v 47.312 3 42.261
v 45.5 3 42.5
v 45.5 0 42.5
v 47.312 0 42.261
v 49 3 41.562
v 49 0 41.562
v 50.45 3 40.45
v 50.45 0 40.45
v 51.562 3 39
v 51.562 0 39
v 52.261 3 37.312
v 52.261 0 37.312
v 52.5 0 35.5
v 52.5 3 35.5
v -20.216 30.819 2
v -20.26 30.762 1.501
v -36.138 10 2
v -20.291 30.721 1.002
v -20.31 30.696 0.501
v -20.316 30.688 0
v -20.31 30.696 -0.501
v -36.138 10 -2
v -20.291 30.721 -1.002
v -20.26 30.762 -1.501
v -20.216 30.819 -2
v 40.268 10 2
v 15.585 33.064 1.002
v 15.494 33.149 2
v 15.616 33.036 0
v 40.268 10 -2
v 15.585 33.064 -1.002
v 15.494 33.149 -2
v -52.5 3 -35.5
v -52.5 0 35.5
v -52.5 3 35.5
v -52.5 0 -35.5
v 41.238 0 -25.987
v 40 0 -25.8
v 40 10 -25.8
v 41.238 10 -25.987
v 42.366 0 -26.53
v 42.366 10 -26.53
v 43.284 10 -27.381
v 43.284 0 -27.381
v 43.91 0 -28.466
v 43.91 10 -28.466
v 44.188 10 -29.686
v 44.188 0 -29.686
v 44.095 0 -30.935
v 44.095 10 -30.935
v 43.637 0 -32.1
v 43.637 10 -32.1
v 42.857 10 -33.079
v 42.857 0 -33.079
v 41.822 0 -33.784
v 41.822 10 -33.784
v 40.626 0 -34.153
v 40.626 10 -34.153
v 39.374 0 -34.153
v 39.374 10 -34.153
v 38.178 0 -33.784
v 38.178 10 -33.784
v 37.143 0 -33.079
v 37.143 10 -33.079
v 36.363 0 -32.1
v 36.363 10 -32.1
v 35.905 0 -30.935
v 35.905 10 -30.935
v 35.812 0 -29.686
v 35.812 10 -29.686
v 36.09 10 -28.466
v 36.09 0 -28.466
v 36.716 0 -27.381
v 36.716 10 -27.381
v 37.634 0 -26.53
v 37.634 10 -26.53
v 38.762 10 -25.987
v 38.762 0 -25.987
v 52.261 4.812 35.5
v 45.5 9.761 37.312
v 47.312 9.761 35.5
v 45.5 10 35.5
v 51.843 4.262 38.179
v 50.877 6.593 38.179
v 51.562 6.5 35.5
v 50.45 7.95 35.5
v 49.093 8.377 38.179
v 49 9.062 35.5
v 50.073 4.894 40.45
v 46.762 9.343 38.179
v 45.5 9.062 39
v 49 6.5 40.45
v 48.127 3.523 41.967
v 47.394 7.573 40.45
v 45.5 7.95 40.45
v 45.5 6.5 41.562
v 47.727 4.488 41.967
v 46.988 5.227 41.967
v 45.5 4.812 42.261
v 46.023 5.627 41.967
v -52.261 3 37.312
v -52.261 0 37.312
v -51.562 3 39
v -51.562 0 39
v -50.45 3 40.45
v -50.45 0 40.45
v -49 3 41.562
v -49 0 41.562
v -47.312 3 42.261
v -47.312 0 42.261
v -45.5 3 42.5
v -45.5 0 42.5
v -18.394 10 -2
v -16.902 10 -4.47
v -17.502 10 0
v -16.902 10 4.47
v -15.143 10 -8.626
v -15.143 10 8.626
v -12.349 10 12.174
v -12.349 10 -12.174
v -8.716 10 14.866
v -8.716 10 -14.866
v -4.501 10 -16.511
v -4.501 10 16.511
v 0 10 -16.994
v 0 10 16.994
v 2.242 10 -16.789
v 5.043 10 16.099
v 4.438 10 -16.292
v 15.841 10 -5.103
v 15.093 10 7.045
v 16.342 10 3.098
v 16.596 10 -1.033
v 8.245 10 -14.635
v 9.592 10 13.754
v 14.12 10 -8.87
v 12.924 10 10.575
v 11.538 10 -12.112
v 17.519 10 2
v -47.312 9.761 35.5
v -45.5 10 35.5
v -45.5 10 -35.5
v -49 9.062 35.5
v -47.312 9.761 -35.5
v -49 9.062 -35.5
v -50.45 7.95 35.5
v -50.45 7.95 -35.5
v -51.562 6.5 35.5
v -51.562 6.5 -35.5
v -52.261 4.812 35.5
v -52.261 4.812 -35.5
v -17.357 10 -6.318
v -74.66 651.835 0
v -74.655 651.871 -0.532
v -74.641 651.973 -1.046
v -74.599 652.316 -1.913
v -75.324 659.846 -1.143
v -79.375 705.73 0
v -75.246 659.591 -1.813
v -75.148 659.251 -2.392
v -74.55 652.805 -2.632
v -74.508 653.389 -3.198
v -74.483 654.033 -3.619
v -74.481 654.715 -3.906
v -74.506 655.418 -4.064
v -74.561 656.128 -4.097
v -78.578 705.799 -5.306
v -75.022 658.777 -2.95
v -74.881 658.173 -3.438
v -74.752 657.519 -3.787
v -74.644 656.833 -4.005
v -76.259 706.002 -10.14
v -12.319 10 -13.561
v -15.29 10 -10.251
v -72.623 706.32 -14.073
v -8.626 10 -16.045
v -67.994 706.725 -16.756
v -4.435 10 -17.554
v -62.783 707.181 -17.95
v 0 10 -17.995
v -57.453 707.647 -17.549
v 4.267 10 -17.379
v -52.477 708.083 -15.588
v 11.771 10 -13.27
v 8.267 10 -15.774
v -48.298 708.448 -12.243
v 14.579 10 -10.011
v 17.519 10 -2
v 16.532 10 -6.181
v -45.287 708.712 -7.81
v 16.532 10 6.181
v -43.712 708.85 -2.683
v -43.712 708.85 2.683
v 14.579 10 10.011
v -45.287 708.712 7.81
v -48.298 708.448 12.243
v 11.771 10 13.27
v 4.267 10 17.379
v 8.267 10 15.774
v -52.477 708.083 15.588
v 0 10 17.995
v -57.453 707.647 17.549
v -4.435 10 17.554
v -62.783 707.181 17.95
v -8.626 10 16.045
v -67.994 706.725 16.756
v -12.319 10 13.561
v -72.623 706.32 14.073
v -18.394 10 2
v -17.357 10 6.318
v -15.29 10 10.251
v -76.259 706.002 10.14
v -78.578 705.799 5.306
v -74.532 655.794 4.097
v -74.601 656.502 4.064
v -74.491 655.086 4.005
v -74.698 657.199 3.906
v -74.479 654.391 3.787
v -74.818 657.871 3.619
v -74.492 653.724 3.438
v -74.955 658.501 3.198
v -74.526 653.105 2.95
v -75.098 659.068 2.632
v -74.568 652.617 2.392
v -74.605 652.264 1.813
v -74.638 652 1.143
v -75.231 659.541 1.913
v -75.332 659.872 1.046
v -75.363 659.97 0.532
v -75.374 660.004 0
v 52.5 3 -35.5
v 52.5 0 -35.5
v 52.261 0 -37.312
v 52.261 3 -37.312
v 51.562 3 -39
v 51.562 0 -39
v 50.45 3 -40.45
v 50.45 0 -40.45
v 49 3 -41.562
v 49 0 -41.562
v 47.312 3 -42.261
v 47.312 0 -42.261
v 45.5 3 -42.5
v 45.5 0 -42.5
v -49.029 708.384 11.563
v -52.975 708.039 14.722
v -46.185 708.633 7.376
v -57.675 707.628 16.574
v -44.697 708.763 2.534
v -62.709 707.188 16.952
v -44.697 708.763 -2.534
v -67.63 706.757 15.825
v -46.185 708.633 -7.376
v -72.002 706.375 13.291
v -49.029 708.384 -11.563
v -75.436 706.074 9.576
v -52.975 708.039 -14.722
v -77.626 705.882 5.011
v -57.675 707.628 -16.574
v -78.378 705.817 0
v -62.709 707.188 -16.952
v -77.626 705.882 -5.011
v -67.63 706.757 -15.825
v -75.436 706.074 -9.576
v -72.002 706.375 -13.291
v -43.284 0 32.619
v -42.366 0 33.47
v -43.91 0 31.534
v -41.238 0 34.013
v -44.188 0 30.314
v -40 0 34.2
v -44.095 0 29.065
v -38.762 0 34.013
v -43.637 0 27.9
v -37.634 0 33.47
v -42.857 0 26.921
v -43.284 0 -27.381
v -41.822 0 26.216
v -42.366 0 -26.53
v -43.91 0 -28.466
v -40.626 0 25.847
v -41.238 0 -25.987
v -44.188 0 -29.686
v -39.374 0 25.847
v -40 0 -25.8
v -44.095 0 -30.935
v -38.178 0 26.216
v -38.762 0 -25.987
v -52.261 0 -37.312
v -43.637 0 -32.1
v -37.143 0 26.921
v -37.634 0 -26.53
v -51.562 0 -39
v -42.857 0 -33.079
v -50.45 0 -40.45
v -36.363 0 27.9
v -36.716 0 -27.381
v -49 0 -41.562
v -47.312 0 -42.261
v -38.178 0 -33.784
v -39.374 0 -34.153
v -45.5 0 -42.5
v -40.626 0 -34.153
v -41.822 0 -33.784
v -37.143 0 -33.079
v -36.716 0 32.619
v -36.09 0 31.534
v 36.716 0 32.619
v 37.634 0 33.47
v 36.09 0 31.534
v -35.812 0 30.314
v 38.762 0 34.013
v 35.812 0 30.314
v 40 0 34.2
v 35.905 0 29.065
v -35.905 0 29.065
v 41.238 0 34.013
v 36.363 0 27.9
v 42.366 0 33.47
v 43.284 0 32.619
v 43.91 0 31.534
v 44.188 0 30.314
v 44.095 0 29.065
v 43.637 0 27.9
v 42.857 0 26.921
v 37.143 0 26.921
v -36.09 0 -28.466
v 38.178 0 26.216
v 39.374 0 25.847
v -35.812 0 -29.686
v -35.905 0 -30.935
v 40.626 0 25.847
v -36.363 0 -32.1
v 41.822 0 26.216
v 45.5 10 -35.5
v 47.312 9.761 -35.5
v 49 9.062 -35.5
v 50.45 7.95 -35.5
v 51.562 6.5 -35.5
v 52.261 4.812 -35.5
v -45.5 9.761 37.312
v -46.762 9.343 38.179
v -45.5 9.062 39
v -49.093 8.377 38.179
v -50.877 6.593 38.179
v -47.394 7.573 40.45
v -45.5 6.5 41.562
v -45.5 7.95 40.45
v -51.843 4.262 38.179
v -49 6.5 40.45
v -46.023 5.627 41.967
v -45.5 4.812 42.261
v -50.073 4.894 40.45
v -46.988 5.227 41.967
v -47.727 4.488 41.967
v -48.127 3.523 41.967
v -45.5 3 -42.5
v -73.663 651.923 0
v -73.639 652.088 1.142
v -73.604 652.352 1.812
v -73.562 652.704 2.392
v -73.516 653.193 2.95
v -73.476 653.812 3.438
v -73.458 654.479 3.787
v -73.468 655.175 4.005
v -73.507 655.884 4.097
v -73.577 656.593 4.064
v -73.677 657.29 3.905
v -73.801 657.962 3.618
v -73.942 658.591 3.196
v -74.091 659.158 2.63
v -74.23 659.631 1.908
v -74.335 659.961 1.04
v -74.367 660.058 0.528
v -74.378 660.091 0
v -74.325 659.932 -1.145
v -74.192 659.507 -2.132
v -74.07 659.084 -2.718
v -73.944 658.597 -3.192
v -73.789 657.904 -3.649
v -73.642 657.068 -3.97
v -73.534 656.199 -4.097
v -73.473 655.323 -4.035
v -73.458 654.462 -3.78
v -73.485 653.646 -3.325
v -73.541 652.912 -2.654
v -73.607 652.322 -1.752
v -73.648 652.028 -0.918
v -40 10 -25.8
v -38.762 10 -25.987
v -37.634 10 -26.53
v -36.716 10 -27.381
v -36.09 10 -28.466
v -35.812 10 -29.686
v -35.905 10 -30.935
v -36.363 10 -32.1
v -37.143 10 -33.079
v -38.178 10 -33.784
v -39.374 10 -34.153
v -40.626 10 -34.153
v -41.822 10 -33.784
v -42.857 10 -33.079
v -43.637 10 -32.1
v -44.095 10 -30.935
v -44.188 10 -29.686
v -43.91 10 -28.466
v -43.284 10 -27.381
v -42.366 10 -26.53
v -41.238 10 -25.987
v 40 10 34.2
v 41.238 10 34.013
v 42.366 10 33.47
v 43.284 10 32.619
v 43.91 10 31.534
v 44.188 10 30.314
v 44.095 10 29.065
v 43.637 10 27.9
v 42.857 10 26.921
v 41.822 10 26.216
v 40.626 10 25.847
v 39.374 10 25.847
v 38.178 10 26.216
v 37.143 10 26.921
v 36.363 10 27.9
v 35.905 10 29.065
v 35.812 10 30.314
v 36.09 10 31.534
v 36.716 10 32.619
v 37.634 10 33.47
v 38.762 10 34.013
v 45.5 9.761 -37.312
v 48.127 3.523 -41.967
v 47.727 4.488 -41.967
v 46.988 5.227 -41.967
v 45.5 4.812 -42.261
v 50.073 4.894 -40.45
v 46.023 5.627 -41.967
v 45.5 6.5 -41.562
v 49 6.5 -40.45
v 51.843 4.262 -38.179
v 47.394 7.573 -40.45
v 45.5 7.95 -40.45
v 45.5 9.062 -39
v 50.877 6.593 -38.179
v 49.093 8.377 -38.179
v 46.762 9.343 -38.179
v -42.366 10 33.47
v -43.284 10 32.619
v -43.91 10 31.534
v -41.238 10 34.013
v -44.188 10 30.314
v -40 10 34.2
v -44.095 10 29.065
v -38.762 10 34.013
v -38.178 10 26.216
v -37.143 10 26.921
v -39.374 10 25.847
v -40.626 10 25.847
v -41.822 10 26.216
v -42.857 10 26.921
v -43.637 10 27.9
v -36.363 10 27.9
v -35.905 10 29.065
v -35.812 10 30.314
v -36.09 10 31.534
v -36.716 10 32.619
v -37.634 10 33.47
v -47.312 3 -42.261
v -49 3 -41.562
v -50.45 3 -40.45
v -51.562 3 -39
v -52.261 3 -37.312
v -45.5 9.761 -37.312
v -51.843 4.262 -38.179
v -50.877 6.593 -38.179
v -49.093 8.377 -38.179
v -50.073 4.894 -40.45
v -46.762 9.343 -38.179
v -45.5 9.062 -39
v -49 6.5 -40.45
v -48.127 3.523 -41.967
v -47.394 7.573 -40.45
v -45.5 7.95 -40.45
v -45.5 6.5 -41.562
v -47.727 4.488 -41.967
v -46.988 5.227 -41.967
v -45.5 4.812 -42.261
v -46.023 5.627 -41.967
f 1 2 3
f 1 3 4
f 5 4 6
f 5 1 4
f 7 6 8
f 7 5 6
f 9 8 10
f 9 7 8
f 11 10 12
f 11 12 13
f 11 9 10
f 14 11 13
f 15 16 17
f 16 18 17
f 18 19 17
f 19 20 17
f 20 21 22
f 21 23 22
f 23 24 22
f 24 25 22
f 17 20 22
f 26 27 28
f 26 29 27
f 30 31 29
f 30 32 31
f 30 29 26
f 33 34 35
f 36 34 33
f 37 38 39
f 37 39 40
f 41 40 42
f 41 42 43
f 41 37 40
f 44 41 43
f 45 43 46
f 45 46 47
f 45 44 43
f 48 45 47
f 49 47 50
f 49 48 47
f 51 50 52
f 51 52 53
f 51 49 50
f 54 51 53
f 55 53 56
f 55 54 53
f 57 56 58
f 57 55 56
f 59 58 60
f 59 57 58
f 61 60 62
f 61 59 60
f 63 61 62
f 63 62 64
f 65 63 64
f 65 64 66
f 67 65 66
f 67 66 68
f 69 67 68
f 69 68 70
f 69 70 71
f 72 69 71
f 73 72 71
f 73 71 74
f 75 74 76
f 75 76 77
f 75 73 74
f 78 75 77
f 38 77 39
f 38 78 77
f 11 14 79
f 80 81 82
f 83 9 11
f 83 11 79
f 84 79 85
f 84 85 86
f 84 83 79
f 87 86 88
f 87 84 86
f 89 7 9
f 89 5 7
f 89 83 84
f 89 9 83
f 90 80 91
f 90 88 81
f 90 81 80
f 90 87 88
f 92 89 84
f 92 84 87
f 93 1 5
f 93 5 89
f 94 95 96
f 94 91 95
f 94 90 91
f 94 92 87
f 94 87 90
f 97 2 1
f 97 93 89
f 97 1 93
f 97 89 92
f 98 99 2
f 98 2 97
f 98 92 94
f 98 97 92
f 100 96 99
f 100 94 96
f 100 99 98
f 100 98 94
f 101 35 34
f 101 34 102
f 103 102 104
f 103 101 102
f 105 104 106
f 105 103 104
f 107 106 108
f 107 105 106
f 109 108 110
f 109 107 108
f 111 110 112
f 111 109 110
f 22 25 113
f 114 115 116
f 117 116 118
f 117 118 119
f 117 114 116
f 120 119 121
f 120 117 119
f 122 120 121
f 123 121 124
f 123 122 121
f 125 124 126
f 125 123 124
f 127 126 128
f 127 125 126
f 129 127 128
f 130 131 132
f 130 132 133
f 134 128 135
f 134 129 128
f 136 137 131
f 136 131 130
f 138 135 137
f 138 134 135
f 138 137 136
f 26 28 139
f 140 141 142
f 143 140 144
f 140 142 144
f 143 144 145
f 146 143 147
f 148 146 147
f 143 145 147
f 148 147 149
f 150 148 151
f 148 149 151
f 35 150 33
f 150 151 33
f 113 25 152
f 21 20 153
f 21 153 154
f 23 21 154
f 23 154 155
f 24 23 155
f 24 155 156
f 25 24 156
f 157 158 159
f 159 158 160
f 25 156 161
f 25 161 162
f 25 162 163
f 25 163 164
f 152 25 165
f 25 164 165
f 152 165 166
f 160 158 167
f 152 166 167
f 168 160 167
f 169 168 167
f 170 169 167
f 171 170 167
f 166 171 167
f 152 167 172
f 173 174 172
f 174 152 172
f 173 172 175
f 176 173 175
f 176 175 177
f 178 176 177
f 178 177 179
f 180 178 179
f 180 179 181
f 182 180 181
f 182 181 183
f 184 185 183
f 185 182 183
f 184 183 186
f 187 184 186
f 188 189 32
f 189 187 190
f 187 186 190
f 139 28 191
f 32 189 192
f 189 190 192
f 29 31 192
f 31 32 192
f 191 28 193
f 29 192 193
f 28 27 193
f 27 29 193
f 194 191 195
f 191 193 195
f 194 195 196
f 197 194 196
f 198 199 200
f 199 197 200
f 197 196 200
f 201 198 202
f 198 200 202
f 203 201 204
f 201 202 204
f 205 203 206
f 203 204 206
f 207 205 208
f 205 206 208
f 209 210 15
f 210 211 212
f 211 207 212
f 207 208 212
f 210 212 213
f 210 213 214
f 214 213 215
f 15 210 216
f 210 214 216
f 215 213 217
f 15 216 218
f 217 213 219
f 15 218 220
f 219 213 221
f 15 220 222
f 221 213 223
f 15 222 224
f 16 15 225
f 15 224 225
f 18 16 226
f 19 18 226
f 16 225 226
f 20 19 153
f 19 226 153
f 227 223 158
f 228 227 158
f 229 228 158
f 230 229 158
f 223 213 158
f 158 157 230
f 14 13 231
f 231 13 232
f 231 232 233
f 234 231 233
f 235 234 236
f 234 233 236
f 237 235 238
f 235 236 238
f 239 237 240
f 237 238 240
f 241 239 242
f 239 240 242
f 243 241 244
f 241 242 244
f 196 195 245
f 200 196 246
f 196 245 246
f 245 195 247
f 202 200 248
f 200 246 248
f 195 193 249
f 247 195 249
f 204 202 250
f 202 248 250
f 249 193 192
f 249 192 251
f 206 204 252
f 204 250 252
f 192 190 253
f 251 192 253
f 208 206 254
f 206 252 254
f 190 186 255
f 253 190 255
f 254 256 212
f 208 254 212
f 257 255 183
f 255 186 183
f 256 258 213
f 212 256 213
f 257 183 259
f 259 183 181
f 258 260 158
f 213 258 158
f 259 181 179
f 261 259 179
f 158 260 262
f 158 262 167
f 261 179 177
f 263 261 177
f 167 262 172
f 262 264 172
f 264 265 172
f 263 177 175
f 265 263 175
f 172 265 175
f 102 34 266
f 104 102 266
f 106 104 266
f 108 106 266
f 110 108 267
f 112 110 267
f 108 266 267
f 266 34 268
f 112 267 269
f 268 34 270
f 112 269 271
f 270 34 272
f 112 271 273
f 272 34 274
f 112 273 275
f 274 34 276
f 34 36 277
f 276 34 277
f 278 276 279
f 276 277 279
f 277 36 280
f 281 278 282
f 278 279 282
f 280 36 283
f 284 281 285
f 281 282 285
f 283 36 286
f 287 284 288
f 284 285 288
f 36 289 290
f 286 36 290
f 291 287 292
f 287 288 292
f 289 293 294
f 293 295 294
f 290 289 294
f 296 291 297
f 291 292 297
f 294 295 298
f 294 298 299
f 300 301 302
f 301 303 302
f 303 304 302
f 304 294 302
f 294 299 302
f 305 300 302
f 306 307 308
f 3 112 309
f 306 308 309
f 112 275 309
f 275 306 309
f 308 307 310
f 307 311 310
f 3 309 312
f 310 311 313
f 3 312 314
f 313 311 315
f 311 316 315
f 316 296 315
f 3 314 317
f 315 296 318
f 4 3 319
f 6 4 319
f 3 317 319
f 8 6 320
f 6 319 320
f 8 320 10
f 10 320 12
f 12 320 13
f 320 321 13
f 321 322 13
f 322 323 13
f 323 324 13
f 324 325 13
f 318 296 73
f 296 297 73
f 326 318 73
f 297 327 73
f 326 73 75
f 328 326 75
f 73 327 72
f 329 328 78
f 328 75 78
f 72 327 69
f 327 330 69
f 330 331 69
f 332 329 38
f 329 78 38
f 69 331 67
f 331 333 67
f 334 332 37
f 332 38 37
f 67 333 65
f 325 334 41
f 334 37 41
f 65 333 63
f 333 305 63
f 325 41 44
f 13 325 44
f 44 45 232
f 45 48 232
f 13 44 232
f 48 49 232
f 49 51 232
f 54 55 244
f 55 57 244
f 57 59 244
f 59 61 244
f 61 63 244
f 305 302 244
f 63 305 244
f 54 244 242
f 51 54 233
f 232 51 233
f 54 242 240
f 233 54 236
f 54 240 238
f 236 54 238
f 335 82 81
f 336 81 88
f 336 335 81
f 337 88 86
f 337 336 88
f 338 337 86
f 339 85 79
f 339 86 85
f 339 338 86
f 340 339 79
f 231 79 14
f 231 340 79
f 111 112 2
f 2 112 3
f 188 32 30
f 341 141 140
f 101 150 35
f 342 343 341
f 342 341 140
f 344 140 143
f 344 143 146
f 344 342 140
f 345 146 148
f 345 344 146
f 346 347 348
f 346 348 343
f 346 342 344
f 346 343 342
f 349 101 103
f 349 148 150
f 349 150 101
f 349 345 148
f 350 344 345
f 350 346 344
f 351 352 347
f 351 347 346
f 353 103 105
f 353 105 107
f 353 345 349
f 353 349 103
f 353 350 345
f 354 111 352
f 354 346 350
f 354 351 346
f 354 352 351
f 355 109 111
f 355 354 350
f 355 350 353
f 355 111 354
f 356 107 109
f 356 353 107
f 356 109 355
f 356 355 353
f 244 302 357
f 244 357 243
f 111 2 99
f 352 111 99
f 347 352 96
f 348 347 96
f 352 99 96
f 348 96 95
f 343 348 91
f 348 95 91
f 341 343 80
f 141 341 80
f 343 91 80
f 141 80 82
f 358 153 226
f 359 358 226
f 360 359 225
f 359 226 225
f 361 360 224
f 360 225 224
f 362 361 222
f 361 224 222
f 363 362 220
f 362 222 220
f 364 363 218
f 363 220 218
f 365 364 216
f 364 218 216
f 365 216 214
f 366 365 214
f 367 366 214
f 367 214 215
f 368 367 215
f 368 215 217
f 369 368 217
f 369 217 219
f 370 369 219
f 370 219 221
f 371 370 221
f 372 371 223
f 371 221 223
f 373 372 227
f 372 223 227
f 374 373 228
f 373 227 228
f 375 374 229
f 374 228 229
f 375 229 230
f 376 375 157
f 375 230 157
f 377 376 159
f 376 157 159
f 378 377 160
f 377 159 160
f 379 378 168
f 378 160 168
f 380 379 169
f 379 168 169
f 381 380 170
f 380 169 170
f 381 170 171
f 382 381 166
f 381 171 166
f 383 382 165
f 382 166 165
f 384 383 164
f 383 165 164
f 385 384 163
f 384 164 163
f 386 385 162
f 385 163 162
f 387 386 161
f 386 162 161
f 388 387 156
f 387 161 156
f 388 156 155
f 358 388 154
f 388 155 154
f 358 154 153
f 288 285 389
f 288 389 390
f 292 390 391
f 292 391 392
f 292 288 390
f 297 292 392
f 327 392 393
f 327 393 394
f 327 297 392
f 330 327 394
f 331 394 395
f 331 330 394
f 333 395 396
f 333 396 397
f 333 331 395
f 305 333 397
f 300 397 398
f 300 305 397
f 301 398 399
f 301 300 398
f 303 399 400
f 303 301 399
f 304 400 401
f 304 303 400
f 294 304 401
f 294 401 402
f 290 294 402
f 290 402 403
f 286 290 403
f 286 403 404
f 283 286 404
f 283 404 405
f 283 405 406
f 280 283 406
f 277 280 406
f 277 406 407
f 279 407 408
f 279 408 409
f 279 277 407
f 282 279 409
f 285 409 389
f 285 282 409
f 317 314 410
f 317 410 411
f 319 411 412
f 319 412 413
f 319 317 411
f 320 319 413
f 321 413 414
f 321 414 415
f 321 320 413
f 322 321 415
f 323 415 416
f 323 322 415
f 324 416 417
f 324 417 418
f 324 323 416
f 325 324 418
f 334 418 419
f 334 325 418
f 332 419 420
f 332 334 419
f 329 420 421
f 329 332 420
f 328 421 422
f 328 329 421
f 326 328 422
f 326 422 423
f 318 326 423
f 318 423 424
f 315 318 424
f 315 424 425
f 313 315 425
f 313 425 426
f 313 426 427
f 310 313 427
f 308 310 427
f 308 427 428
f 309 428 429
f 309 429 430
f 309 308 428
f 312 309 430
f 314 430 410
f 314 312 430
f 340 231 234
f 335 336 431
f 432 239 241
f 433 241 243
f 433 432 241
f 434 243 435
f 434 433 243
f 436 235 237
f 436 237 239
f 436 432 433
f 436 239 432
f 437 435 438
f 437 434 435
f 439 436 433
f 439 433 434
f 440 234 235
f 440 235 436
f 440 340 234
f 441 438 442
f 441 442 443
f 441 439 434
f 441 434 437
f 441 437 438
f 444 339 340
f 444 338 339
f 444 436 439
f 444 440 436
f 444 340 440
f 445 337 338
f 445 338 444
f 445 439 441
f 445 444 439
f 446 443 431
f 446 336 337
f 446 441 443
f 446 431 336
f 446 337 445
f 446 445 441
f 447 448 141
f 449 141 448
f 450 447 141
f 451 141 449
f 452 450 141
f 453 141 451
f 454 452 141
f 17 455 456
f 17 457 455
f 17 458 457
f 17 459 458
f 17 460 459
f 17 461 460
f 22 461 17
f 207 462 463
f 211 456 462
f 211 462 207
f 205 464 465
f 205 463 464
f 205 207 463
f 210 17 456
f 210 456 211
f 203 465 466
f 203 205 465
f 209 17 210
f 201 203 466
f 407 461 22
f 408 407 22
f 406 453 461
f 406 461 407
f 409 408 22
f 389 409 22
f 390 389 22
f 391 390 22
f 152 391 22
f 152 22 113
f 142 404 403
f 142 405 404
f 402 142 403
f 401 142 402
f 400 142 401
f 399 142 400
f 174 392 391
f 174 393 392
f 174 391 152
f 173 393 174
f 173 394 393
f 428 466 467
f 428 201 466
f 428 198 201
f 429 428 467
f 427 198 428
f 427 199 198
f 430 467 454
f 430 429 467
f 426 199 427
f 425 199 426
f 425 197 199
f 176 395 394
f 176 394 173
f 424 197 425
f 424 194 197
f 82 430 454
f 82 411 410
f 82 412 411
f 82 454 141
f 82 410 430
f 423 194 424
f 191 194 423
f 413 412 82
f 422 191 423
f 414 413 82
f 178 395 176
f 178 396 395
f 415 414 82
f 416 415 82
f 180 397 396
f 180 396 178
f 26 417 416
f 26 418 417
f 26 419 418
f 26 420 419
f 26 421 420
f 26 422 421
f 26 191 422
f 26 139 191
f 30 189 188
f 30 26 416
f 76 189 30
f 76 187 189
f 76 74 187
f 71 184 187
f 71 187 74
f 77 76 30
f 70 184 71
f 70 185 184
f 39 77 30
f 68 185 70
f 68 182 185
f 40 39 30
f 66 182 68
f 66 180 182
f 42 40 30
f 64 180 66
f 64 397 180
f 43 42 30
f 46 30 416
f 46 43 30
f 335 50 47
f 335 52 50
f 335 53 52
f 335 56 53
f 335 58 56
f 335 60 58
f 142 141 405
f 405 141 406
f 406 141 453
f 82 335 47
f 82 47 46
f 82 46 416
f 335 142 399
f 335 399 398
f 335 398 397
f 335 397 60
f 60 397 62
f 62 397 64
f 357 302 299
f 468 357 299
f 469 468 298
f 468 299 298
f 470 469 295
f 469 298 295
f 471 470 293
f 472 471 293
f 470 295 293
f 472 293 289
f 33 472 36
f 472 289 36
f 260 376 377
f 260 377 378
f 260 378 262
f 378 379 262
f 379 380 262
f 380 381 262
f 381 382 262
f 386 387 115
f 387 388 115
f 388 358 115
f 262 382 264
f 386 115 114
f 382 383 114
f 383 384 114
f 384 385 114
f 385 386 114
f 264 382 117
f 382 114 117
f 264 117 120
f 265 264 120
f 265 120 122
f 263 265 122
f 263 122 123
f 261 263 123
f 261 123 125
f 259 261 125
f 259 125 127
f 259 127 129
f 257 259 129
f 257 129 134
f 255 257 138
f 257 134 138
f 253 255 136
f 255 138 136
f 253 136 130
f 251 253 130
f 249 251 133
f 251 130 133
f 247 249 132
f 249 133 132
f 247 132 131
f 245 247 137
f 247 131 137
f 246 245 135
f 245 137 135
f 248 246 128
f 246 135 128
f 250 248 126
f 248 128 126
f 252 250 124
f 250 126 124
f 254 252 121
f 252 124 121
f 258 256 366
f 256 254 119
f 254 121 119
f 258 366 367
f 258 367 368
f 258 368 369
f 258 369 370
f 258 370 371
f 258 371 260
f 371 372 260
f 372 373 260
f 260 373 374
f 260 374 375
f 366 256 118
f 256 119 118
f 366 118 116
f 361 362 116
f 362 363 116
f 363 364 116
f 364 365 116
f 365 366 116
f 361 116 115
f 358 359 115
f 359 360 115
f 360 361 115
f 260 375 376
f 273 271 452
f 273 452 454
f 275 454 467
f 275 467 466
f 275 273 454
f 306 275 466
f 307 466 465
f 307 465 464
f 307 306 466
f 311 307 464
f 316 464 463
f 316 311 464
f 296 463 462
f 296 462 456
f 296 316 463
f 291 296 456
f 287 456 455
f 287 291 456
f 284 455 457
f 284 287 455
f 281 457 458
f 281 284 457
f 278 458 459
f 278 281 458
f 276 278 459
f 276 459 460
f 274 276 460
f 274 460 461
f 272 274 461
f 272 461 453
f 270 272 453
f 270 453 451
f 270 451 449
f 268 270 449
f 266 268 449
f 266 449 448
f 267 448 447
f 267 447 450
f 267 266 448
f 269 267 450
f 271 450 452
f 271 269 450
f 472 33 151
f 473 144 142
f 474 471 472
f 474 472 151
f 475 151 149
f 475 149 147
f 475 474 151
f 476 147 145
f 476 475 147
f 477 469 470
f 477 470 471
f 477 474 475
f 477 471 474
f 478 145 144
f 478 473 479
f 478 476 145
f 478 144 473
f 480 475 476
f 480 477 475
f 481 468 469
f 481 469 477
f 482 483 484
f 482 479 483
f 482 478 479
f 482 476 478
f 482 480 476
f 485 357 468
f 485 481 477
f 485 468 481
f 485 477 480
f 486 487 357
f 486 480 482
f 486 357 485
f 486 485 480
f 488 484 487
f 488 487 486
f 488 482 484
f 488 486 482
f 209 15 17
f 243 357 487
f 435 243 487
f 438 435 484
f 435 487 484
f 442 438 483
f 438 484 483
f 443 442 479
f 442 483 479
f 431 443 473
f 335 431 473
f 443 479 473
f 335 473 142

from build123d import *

# Parameters (mm, degrees)
SKETCH1_W                       = 105
SKETCH1_H                       = 85
SKETCH1_R                       = 4.2
BOSS_EXTRUDE1_DEPTH             = 10
SKETCH14_R                      = 18
SKETCH14_R_2                    = 17
BOSS_EXTRUDE4_DEPTH             = 700
BOSS_EXTRUDE4_DIRECTION_2_REACH = 70.283
RIB2_REACH                      = 716.562
SKETCH21_WALL_W                 = 1464.864259786
SKETCH21_WALL_H                 = 4
RIB5_REACH                      = 716.562
SKETCH22_WALL_W                 = 1457.169117376
SKETCH22_WALL_H                 = 4
FILLET1_R                       = 7
FILLET2_R                       = 7
CUT_EXTRUDE1_REACH              = 717.102
CUT_EXTRUDE1_END_RADIUS         = 17
SKETCH26_R                      = 4.1


with BuildPart() as part:
    # Sketch1 → Boss-Extrude1 (new body)
    with BuildSketch(Plane(origin=(0, 0, 0), x_dir=(1, 0, 0), z_dir=(0, 1, 0))):
        Rectangle(SKETCH1_W, SKETCH1_H)
        with Locations(Location((-40, -30, 0), (0, 0, 270))):
            Circle(SKETCH1_R, mode=Mode.SUBTRACT)
        with Locations(Location((40, 30, 0), (0, 0, 270))):
            Circle(SKETCH1_R, mode=Mode.SUBTRACT)
        with Locations(Location((40, -30, 0), (0, 0, 270))):
            Circle(SKETCH1_R, mode=Mode.SUBTRACT)
        with Locations(Location((-40, 30, 0), (0, 0, 270))):
            Circle(SKETCH1_R, mode=Mode.SUBTRACT)
    extrude(amount=BOSS_EXTRUDE1_DEPTH)

    # Sketch14 → Boss-Extrude4 (add)
    with BuildSketch(Plane(origin=(0, 10, 0), x_dir=(-0.9961946980917459, -0.08715574274765506, 0), z_dir=(0.08715574274765506, -0.9961946980917459, 0))):
        with Locations((0.435778714, 0)):
            Circle(SKETCH14_R)
        with Locations((0.435778714, 0)):
            Circle(SKETCH14_R_2, mode=Mode.SUBTRACT)
    extrude(amount=-BOSS_EXTRUDE4_DEPTH)

    # Boss-Extrude4 direction 2: up to this face of the body (flat: up to its plane)
    boss_extrude4_direction_2_end = Plane(part.part.faces().sort_by_distance((0, 10, 0))[0])
    # Sketch14 → Boss-Extrude4 direction 2 (add, up to the picked face)
    with BuildSketch(Plane(origin=(0, 10, 0), x_dir=(-0.9961946980917459, -0.08715574274765506, 0), z_dir=(0.08715574274765506, -0.9961946980917459, 0)), mode=Mode.PRIVATE) as boss_extrude4_direction_2_sk1:
        with Locations((0.435778714, 0)):
            Circle(SKETCH14_R)
        with Locations((0.435778714, 0)):
            Circle(SKETCH14_R_2, mode=Mode.SUBTRACT)
    boss_extrude4_direction_2_tool1 = split(extrude(boss_extrude4_direction_2_sk1.sketch, amount=BOSS_EXTRUDE4_DIRECTION_2_REACH, mode=Mode.PRIVATE), bisect_by=boss_extrude4_direction_2_end, keep=Keep.BOTH, mode=Mode.PRIVATE)
    add(boss_extrude4_direction_2_tool1.solids().sort_by(Axis((16.990205, 11.48645, 0), (0.08715574274765506, -0.9961946980917459, 0)))[0])

    # Sketch21 wall → Rib2 (add, up to next)
    with BuildSketch(Plane(origin=(27.942090865, 21.517823641, 0), x_dir=(0.730658017889, -0.682743627502, 0), z_dir=(0.682743627502, 0.730658017889, 0)), mode=Mode.PRIVATE) as rib2_sk1:
        Rectangle(SKETCH21_WALL_W, SKETCH21_WALL_H)
    rib2_tool1 = extrude(rib2_sk1.sketch, amount=-RIB2_REACH, mode=Mode.PRIVATE) - part.part
    add(rib2_tool1.solids().sort_by_distance((27.942090865, 21.517823641, 0))[0])

    # Sketch22 wall → Rib5 (add, up to next)
    with BuildSketch(Plane(origin=(-28.227154914, 20.343956887, 0), x_dir=(-0.607494293968, -0.794324041432, 0), z_dir=(0.794324041432, -0.607494293968, 0)), mode=Mode.PRIVATE) as rib5_sk1:
        Rectangle(SKETCH22_WALL_W, SKETCH22_WALL_H)
    rib5_tool1 = extrude(rib5_sk1.sketch, amount=RIB5_REACH, mode=Mode.PRIVATE) - part.part
    add(rib5_tool1.solids().sort_by_distance((-28.227154914, 20.343956887, 0))[0])

    # Fillet1
    fillet1_edges = [part.edges().sort_by_distance(p)[0] for p in [
        (52.5, 10, 0),
        (-52.5, 10, 0),
        (52.5, 5, 42.5),
        (-52.5, 5, 42.5),
    ]]
    fillet(fillet1_edges, radius=FILLET1_R)

    # Fillet2
    # the kernel refuses this fillet: 7 mm, written as the material it takes off along each edge
    with BuildSketch(Plane(origin=(45.5, 3, 35.5), x_dir=(0, 1, 0), z_dir=(0, 0, 1))) as fillet2_piece_1_section:
        Polygon((0, 0), (FILLET2_R, 0), (FILLET2_R, -FILLET2_R), (0, -FILLET2_R), align=None)
    fillet2_piece_1 = extrude(amount=FILLET2_R, mode=Mode.PRIVATE)
    fillet2_piece_1 = fillet2_piece_1 - Plane(origin=(45.5, 3, 35.5), x_dir=(-0.7071067811865475, -0.7071067811865475, 0), z_dir=(0, 0, 1)) * Sphere(FILLET2_R, mode=Mode.PRIVATE)
    add(fillet2_piece_1, mode=Mode.SUBTRACT)
    with BuildSketch(Plane(origin=(-45.5, 3, 35.5), x_dir=(0, 1, 0), z_dir=(0, 0, 1))) as fillet2_piece_2_section:
        Polygon((0, 0), (FILLET2_R, 0), (FILLET2_R, FILLET2_R), (0, FILLET2_R), align=None)
    fillet2_piece_2 = extrude(amount=FILLET2_R, mode=Mode.PRIVATE)
    fillet2_piece_2 = fillet2_piece_2 - Plane(origin=(-45.5, 3, 35.5), x_dir=(0.7071067811865475, -0.7071067811865475, 0), z_dir=(0, 0, 1)) * Sphere(FILLET2_R, mode=Mode.PRIVATE)
    add(fillet2_piece_2, mode=Mode.SUBTRACT)
    with BuildSketch(Plane(origin=(-45.5, 10, -42.5), x_dir=(0, 0, 1), z_dir=(1, 0, 0))) as fillet2_piece_3:
        with BuildLine():
            CenterArc((FILLET2_R, FILLET2_R), FILLET2_R, 180, 90)
            Line((0, FILLET2_R), (0, 0))
            Line((0, 0), (FILLET2_R, 0))
        make_face()
    extrude(amount=91, mode=Mode.SUBTRACT)
    with BuildSketch(Plane(origin=(45.5, 10, 42.5), x_dir=(0, -1, 0), z_dir=(-1, 0, 0))) as fillet2_piece_4:
        with BuildLine():
            CenterArc((FILLET2_R, -FILLET2_R), FILLET2_R, 90, 90)
            Line((0, -FILLET2_R), (0, 0))
            Line((0, 0), (FILLET2_R, 0))
        make_face()
    extrude(amount=91, mode=Mode.SUBTRACT)
    with BuildSketch(Plane(origin=(-52.5, -17.5, -42.5), x_dir=(0, 0, 1), z_dir=(0, 1, 0))) as fillet2_piece_5:
        with BuildLine():
            CenterArc((FILLET2_R, FILLET2_R), FILLET2_R, 180, 90)
            Line((0, FILLET2_R), (0, 0))
            Line((0, 0), (FILLET2_R, 0))
        make_face()
    extrude(amount=20.5, mode=Mode.SUBTRACT)
    with BuildSketch(Plane(origin=(52.5, -17.5, -42.5), x_dir=(0, 0, 1), z_dir=(0, 1, 0))) as fillet2_piece_6:
        with BuildLine():
            CenterArc((FILLET2_R, -FILLET2_R), FILLET2_R, 90, 90)
            Line((0, -FILLET2_R), (0, 0))
            Line((0, 0), (FILLET2_R, 0))
        make_face()
    extrude(amount=20.5, mode=Mode.SUBTRACT)
    with BuildSketch(Plane(origin=(-45.5, 3, -42.5), x_dir=(-1, 0, 0), z_dir=(0, -1, 0))) as fillet2_piece_7:
        with BuildLine():
            CenterArc((7 - FILLET2_R, -FILLET2_R), FILLET2_R, 0, 90)
            Line((7, -FILLET2_R), (7, 0))
            Line((7, 0), (7 - FILLET2_R, 0))
        make_face()
    revolve(axis=Axis((-45.5, 3, -42.5), (0, 0, -1)), revolution_arc=90, mode=Mode.SUBTRACT)
    with BuildSketch(Plane(origin=(45.5, 3, -42.5), x_dir=(1, 0, 0), z_dir=(0, -1, 0))) as fillet2_piece_8:
        with BuildLine():
            CenterArc((7 - FILLET2_R, FILLET2_R), FILLET2_R, 270, 90)
            Line((7, FILLET2_R), (7, 0))
            Line((7, 0), (7 - FILLET2_R, 0))
        make_face()
    revolve(axis=Axis((45.5, 3, -42.5), (0, 0, 1)), revolution_arc=90, mode=Mode.SUBTRACT)

    # Cut-Extrude1: up to this cylinder (the profile starts outside it)
    cut_extrude1_end = Plane(origin=(-57.085353251, 657.488573385, 0), z_dir=(-0.08715574274765504, 0.9961946980917459, 0)) * Cylinder(CUT_EXTRUDE1_END_RADIUS, 1469.204, mode=Mode.PRIVATE)
    # Sketch26 → Cut-Extrude1 (cut, up to the surface)
    with BuildSketch(Plane(origin=(-17.497384121, -1.530822752, 0), x_dir=(0, 0, 1), z_dir=(-0.9961946980917459, -0.08715574274765504, 0)), mode=Mode.PRIVATE) as cut_extrude1_sk1:
        with Locations(Location((0, 659.961946981, 0), (0, 0, 270))):
            Circle(SKETCH26_R)
    cut_extrude1_tool1 = extrude(cut_extrude1_sk1.sketch, amount=-CUT_EXTRUDE1_REACH, mode=Mode.PRIVATE) - cut_extrude1_end
    add(cut_extrude1_tool1.solids().sort_by_distance((-75.016858, 655.91977, 0))[0], mode=Mode.SUBTRACT)


solid = part.part
